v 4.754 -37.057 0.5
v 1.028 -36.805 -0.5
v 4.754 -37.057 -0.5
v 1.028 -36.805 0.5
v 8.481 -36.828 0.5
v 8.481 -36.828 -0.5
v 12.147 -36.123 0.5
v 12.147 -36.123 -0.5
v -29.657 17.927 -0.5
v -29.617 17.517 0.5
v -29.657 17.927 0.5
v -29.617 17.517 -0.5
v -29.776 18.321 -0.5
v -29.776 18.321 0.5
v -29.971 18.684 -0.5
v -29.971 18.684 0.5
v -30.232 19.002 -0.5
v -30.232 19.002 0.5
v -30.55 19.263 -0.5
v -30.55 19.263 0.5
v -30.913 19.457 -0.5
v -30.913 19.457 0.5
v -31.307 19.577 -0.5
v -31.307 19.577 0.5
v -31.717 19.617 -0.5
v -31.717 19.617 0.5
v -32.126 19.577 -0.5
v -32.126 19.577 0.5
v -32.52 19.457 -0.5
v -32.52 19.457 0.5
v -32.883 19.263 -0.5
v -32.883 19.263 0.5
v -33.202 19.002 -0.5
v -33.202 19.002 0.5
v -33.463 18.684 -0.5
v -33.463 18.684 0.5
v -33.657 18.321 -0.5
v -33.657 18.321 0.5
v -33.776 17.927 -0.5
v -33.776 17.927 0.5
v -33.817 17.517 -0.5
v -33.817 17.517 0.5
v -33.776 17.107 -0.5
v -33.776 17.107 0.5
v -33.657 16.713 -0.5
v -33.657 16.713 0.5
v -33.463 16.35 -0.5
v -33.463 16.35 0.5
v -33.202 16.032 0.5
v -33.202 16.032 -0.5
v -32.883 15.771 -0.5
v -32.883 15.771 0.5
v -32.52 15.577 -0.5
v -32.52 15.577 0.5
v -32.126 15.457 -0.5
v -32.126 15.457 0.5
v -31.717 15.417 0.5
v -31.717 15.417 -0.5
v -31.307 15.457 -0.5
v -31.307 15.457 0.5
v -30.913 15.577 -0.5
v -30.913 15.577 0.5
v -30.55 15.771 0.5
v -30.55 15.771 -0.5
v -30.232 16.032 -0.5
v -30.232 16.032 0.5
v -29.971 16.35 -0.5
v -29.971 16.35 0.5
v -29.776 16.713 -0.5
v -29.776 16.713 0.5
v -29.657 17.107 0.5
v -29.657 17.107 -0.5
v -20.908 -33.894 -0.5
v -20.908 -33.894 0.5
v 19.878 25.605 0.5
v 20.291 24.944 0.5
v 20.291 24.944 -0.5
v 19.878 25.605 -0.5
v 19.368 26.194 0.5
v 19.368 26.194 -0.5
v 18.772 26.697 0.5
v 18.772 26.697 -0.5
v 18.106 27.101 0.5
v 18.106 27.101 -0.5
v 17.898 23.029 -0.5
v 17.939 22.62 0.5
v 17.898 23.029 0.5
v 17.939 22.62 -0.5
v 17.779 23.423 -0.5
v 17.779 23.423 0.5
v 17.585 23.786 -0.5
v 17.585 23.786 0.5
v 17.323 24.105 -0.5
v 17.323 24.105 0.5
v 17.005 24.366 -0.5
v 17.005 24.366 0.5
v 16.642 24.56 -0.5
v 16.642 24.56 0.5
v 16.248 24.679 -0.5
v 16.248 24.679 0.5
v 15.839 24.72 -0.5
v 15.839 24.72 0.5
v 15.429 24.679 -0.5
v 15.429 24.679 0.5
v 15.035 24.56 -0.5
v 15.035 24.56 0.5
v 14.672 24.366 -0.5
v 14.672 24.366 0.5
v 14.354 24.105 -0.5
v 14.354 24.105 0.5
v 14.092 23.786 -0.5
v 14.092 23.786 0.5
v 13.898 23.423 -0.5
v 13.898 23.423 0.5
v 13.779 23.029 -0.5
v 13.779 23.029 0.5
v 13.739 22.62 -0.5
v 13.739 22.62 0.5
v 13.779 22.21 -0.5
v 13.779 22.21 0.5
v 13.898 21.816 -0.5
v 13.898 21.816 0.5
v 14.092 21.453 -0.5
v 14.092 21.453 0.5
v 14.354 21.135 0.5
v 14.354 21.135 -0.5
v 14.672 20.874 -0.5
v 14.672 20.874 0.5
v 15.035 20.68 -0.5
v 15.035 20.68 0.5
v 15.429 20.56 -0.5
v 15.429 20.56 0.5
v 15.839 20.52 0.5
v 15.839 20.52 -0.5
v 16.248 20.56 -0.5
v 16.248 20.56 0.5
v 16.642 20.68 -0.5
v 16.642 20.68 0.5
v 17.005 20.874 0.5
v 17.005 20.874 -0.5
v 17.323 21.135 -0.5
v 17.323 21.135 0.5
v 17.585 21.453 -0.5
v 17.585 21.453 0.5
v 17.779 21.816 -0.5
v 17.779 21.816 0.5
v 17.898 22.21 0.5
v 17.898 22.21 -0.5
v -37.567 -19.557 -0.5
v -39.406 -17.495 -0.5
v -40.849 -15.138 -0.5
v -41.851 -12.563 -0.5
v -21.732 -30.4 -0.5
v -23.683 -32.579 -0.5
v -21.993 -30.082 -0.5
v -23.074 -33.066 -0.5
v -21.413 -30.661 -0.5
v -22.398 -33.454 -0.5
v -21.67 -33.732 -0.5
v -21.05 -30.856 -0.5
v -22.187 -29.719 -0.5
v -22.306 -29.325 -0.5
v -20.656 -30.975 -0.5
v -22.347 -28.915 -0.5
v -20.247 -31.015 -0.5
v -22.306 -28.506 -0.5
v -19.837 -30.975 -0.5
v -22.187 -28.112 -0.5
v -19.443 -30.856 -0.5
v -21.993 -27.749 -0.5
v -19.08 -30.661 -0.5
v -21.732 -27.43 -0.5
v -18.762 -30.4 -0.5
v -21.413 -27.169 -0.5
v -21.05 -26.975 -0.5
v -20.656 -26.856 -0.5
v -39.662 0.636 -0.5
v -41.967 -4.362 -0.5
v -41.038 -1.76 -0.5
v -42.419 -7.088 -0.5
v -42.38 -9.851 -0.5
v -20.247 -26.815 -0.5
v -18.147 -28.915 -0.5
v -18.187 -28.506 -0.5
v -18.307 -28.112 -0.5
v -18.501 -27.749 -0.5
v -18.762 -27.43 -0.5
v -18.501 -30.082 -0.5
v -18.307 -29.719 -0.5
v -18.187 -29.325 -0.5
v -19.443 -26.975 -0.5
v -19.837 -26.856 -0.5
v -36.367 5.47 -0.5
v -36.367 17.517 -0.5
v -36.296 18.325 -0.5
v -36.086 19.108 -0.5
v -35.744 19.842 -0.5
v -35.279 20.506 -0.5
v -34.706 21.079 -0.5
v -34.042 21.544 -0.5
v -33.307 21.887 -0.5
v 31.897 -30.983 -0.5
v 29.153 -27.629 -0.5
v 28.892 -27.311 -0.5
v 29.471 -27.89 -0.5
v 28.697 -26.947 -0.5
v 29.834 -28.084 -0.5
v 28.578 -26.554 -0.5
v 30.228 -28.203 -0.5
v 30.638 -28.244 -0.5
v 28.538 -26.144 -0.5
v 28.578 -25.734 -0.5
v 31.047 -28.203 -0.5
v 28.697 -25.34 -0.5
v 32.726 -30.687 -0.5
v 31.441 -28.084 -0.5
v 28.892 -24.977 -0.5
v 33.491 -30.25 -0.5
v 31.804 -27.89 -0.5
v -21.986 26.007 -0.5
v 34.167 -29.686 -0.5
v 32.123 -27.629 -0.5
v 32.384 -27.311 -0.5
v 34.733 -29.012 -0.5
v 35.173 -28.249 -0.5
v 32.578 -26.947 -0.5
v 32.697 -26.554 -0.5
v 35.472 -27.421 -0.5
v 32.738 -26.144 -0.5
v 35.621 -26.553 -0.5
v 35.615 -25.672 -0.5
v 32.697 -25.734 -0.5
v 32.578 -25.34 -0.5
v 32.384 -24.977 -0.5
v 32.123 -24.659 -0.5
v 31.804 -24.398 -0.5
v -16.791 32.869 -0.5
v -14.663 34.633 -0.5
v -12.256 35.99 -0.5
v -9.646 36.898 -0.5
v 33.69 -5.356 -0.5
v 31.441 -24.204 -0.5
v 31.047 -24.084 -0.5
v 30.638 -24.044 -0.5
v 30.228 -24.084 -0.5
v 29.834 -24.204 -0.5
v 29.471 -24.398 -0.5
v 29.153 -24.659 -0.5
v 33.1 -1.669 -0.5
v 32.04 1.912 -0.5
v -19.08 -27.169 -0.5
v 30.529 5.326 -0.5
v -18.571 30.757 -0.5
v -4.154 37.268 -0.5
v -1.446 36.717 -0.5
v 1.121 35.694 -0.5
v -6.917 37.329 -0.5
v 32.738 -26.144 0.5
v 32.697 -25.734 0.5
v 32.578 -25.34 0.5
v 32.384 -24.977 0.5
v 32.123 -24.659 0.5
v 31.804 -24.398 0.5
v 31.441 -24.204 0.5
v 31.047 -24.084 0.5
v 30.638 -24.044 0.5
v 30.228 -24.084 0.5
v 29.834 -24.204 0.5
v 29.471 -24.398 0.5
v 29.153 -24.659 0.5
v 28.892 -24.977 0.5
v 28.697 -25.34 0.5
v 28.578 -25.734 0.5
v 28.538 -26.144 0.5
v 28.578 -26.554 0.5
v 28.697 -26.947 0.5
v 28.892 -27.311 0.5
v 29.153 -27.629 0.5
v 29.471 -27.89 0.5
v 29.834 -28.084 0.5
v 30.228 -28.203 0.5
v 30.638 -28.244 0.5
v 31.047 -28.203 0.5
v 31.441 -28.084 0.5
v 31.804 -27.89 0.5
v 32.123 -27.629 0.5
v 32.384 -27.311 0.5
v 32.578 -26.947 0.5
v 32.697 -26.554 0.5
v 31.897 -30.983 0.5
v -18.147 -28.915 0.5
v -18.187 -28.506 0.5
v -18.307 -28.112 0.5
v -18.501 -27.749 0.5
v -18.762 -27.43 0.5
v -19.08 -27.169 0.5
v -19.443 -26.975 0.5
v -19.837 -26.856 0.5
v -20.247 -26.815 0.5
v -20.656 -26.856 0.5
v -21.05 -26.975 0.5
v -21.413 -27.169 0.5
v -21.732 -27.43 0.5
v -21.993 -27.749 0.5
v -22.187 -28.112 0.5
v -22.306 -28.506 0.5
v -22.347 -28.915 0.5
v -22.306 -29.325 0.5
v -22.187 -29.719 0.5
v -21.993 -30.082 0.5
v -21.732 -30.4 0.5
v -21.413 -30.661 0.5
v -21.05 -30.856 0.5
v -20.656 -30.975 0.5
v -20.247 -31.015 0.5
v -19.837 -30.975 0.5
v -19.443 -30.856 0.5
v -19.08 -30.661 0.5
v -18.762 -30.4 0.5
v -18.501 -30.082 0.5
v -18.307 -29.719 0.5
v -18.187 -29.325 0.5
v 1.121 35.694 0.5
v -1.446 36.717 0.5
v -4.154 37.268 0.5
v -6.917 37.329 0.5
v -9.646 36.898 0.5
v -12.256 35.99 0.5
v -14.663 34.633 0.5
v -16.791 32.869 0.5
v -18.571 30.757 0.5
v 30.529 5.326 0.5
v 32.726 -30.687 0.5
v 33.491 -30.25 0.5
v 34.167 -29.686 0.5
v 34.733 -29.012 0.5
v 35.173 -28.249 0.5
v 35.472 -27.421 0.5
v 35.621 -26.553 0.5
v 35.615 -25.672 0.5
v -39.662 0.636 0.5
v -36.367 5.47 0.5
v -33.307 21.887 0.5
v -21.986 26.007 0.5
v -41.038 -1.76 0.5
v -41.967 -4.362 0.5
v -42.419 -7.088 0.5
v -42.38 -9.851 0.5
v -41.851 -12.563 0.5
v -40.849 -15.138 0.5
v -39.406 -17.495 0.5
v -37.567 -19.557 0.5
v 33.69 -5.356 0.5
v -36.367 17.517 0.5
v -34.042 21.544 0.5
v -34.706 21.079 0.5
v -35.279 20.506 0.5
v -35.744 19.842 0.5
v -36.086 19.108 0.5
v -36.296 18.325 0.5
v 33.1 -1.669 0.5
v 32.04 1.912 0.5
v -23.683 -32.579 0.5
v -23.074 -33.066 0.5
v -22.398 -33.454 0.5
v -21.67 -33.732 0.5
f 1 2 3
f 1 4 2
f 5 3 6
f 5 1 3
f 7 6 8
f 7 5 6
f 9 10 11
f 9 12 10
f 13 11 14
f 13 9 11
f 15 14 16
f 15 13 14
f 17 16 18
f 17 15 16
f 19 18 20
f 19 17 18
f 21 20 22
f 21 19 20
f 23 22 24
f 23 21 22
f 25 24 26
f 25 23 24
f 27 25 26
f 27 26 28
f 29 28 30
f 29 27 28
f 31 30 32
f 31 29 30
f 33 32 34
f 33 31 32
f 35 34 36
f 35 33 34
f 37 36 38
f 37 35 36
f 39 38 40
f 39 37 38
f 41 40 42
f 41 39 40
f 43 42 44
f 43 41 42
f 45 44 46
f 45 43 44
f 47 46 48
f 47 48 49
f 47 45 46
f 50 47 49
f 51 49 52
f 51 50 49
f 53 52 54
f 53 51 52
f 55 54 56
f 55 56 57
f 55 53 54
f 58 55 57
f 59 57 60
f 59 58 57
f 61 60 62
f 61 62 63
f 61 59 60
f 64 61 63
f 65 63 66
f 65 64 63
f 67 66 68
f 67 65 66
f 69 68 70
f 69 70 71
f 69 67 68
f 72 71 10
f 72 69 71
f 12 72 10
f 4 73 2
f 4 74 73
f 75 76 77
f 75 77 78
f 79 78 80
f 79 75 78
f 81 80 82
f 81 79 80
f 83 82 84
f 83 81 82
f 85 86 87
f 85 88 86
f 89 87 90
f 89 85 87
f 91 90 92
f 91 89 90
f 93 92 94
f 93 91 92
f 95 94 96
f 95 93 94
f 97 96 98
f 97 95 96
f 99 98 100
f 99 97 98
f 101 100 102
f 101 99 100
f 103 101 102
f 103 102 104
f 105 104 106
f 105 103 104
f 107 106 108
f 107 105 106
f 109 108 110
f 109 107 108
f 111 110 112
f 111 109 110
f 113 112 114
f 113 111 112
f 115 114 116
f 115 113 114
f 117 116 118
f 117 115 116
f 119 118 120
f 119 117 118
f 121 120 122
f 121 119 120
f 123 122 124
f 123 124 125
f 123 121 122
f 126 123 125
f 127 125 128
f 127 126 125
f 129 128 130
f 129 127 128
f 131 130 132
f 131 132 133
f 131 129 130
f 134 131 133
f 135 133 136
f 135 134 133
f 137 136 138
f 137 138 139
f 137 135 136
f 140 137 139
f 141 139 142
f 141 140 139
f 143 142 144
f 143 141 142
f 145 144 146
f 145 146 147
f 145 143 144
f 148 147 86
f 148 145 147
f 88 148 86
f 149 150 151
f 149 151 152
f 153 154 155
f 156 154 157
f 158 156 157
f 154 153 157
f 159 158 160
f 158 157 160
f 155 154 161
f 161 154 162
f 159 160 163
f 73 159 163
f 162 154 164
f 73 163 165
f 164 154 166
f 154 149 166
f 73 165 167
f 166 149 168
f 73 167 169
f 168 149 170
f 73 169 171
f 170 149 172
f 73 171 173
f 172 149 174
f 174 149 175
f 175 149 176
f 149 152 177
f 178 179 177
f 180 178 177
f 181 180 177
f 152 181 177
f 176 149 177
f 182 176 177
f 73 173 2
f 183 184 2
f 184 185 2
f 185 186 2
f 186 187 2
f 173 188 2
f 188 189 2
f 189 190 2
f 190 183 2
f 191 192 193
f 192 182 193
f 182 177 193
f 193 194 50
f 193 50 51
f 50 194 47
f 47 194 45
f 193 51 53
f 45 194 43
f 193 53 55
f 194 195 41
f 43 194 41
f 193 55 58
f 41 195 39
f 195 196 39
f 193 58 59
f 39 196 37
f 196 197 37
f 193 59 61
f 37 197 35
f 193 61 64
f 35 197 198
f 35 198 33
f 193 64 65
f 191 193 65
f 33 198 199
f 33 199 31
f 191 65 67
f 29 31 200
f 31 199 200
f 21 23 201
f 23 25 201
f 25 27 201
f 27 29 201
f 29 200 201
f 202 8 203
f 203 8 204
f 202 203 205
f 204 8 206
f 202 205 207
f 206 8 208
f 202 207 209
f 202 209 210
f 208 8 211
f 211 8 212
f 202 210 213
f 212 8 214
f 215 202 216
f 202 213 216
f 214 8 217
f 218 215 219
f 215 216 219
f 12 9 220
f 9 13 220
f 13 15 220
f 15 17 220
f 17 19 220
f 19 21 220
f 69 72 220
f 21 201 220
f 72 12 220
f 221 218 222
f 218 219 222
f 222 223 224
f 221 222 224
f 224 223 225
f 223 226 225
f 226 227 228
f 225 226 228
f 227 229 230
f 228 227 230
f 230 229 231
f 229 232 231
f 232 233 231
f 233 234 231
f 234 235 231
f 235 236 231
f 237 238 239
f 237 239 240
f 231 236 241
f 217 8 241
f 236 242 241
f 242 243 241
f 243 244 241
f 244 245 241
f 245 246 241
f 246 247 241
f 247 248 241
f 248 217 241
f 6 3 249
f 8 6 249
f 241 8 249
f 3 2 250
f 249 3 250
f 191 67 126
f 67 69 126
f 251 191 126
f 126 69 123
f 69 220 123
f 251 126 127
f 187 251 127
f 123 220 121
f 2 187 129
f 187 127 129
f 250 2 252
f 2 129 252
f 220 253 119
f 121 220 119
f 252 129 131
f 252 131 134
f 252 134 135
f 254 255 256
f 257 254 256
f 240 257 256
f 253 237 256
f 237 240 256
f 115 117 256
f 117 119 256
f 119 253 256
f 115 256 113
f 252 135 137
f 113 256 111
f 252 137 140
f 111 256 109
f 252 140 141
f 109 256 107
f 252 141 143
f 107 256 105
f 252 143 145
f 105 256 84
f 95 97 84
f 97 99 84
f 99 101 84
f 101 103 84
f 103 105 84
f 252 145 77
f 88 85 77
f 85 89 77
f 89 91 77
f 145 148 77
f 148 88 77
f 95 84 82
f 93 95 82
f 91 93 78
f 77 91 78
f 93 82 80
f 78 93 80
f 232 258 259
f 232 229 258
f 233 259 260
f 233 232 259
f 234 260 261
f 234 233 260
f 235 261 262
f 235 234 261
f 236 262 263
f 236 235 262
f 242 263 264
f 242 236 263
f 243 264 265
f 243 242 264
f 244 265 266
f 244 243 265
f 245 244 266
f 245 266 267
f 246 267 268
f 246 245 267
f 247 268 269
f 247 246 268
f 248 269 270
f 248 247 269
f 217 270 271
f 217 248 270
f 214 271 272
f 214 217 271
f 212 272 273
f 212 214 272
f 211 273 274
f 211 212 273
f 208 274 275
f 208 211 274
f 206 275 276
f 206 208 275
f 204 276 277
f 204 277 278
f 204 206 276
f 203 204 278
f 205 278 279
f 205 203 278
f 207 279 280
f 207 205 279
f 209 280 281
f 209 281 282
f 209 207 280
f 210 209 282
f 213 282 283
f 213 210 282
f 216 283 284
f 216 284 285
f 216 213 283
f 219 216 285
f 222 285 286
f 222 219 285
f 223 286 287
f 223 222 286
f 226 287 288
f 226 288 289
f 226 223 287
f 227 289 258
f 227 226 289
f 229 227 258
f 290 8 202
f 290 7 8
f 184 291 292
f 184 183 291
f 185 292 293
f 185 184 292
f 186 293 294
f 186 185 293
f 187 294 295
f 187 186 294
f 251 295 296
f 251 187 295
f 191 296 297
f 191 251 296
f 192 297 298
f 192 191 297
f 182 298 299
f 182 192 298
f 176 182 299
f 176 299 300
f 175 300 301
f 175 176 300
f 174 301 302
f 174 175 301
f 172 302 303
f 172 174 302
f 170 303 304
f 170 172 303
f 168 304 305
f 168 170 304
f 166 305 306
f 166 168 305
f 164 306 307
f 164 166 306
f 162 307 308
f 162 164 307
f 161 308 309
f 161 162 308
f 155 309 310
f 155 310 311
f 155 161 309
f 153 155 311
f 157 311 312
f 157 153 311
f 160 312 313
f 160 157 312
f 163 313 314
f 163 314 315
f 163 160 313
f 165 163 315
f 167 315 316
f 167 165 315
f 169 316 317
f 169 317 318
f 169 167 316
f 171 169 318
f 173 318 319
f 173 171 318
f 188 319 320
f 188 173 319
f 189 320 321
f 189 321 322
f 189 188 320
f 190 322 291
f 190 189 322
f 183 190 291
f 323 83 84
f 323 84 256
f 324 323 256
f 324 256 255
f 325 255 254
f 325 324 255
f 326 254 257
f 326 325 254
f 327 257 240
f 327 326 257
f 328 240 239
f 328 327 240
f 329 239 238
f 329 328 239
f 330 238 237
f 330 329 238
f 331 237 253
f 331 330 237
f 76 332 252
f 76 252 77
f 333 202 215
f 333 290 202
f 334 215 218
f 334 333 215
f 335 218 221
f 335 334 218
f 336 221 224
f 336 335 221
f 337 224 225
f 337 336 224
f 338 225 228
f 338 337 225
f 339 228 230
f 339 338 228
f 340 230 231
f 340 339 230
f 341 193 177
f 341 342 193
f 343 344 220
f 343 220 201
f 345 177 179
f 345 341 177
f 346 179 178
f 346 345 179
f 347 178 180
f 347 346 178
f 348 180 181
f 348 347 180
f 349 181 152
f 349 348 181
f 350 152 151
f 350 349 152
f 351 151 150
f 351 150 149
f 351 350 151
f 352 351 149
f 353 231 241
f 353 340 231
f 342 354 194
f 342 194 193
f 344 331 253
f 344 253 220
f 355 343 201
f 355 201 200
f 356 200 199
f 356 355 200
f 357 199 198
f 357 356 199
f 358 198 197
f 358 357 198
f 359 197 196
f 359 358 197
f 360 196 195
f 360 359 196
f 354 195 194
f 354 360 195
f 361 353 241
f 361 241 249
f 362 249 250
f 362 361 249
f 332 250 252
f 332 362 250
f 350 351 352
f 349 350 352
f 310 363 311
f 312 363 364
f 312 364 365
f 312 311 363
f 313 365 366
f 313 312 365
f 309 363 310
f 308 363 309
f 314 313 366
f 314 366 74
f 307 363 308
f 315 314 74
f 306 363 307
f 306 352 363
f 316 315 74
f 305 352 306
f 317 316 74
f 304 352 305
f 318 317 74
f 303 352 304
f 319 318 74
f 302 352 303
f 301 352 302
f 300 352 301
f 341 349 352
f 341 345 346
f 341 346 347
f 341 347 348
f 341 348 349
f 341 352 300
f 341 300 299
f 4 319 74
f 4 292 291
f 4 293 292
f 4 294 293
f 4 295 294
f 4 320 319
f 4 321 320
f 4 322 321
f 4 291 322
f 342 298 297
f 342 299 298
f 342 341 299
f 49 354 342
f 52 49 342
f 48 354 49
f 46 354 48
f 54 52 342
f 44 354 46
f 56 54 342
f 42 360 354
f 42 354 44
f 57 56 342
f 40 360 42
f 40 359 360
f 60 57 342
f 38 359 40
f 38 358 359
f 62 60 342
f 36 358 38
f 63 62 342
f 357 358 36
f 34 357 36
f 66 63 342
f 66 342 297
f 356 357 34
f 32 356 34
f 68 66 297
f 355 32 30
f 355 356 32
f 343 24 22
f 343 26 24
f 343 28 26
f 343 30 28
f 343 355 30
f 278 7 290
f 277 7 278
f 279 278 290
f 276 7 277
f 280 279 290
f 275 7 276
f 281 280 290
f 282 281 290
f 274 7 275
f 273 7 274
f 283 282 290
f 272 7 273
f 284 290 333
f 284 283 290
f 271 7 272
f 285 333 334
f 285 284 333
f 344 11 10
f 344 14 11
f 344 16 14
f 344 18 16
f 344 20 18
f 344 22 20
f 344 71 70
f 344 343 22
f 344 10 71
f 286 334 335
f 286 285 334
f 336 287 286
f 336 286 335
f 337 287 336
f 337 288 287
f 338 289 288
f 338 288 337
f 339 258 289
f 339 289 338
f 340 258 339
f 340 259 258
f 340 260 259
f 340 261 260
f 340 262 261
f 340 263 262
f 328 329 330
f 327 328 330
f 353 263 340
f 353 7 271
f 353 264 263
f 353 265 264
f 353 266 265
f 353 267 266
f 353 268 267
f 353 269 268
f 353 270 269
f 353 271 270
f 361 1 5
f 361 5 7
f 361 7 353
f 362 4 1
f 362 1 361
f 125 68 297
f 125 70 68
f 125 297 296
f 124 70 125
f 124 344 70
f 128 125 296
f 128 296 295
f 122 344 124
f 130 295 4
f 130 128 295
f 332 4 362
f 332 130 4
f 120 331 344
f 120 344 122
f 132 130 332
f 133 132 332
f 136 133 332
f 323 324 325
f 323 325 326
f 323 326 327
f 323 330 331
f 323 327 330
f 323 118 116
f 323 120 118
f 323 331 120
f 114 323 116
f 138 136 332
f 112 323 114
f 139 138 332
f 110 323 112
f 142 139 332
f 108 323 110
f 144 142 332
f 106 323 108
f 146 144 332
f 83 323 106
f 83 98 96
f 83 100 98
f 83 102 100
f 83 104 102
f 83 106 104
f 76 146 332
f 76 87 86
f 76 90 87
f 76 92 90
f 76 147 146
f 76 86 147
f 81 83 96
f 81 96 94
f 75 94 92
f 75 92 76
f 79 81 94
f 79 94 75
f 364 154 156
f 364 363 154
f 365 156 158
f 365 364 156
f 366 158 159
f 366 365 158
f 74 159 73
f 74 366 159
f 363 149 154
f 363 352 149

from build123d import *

# Parameters (mm, degrees)
ESQUISSE1_R          = 2.1
BASE_EXTRUSION_DEPTH = 0.5


with BuildPart() as part:
    # Esquisse1 → Base-Extrusion (new, symmetric)
    with BuildSketch(Plane.XY):
        with BuildLine():
            Line((35.615327088, -25.672223926), (33.690495331, -5.355736059))
            ThreePointArc((33.690495331, -5.355736059), (32.627582421, 0.138570374), (30.529161577, 5.326423206))
            Line((30.529161577, 5.326423206), (20.291189648, 24.943575231))
            ThreePointArc((20.291189648, 24.943575231), (19.367522251, 26.19363098), (18.105897834, 27.101433088))
            Line((18.105897834, 27.101433088), (1.120998661, 35.694422442))
            ThreePointArc((1.120998661, 35.694422442), (-9.646140892, 36.898255889), (-18.57139047, 30.756559943))
            Line((-18.57139047, 30.756559943), (-21.986449586, 26.007166333))
            Line((-21.986449586, 26.007166333), (-33.307069298, 21.886797725))
            ThreePointArc((-33.307069298, 21.886797725), (-35.52580407, 20.184302655), (-36.366774139, 17.517086354))
            Line((-36.366774139, 17.517086354), (-36.366774139, 5.469934486))
            Line((-36.366774139, 5.469934486), (-39.661725259, 0.636440352))
            ThreePointArc((-39.661725259, 0.636440352), (-42.380416479, -9.851134542), (-37.566604459, -19.557200839))
            Line((-37.566604459, -19.557200839), (-23.682658123, -32.578809807))
            ThreePointArc((-23.682658123, -32.578809807), (-22.398102217, -33.453862354), (-20.907521199, -33.894281545))
            Line((-20.907521199, -33.894281545), (1.028164427, -36.805367071))
            ThreePointArc((1.028164427, -36.805367071), (6.620853648, -37.002887485), (12.147350486, -36.122535429))
            Line((12.147350486, -36.122535429), (31.896935448, -30.982637535))
            ThreePointArc((31.896935448, -30.982637535), (34.733377642, -29.011706008), (35.615327088, -25.672223926))
        make_face()
        with Locations((15.838548739, 22.619791811)):
            Circle(ESQUISSE1_R, mode=Mode.SUBTRACT)
        with Locations((-31.716624427, 17.517086354)):
            Circle(ESQUISSE1_R, mode=Mode.SUBTRACT)
        with Locations((-20.246771948, -28.915387001)):
            Circle(ESQUISSE1_R, mode=Mode.SUBTRACT)
        with Locations((30.63761742, -26.143823826)):
            Circle(ESQUISSE1_R, mode=Mode.SUBTRACT)
    extrude(amount=BASE_EXTRUSION_DEPTH, both=True)


solid = part.part
